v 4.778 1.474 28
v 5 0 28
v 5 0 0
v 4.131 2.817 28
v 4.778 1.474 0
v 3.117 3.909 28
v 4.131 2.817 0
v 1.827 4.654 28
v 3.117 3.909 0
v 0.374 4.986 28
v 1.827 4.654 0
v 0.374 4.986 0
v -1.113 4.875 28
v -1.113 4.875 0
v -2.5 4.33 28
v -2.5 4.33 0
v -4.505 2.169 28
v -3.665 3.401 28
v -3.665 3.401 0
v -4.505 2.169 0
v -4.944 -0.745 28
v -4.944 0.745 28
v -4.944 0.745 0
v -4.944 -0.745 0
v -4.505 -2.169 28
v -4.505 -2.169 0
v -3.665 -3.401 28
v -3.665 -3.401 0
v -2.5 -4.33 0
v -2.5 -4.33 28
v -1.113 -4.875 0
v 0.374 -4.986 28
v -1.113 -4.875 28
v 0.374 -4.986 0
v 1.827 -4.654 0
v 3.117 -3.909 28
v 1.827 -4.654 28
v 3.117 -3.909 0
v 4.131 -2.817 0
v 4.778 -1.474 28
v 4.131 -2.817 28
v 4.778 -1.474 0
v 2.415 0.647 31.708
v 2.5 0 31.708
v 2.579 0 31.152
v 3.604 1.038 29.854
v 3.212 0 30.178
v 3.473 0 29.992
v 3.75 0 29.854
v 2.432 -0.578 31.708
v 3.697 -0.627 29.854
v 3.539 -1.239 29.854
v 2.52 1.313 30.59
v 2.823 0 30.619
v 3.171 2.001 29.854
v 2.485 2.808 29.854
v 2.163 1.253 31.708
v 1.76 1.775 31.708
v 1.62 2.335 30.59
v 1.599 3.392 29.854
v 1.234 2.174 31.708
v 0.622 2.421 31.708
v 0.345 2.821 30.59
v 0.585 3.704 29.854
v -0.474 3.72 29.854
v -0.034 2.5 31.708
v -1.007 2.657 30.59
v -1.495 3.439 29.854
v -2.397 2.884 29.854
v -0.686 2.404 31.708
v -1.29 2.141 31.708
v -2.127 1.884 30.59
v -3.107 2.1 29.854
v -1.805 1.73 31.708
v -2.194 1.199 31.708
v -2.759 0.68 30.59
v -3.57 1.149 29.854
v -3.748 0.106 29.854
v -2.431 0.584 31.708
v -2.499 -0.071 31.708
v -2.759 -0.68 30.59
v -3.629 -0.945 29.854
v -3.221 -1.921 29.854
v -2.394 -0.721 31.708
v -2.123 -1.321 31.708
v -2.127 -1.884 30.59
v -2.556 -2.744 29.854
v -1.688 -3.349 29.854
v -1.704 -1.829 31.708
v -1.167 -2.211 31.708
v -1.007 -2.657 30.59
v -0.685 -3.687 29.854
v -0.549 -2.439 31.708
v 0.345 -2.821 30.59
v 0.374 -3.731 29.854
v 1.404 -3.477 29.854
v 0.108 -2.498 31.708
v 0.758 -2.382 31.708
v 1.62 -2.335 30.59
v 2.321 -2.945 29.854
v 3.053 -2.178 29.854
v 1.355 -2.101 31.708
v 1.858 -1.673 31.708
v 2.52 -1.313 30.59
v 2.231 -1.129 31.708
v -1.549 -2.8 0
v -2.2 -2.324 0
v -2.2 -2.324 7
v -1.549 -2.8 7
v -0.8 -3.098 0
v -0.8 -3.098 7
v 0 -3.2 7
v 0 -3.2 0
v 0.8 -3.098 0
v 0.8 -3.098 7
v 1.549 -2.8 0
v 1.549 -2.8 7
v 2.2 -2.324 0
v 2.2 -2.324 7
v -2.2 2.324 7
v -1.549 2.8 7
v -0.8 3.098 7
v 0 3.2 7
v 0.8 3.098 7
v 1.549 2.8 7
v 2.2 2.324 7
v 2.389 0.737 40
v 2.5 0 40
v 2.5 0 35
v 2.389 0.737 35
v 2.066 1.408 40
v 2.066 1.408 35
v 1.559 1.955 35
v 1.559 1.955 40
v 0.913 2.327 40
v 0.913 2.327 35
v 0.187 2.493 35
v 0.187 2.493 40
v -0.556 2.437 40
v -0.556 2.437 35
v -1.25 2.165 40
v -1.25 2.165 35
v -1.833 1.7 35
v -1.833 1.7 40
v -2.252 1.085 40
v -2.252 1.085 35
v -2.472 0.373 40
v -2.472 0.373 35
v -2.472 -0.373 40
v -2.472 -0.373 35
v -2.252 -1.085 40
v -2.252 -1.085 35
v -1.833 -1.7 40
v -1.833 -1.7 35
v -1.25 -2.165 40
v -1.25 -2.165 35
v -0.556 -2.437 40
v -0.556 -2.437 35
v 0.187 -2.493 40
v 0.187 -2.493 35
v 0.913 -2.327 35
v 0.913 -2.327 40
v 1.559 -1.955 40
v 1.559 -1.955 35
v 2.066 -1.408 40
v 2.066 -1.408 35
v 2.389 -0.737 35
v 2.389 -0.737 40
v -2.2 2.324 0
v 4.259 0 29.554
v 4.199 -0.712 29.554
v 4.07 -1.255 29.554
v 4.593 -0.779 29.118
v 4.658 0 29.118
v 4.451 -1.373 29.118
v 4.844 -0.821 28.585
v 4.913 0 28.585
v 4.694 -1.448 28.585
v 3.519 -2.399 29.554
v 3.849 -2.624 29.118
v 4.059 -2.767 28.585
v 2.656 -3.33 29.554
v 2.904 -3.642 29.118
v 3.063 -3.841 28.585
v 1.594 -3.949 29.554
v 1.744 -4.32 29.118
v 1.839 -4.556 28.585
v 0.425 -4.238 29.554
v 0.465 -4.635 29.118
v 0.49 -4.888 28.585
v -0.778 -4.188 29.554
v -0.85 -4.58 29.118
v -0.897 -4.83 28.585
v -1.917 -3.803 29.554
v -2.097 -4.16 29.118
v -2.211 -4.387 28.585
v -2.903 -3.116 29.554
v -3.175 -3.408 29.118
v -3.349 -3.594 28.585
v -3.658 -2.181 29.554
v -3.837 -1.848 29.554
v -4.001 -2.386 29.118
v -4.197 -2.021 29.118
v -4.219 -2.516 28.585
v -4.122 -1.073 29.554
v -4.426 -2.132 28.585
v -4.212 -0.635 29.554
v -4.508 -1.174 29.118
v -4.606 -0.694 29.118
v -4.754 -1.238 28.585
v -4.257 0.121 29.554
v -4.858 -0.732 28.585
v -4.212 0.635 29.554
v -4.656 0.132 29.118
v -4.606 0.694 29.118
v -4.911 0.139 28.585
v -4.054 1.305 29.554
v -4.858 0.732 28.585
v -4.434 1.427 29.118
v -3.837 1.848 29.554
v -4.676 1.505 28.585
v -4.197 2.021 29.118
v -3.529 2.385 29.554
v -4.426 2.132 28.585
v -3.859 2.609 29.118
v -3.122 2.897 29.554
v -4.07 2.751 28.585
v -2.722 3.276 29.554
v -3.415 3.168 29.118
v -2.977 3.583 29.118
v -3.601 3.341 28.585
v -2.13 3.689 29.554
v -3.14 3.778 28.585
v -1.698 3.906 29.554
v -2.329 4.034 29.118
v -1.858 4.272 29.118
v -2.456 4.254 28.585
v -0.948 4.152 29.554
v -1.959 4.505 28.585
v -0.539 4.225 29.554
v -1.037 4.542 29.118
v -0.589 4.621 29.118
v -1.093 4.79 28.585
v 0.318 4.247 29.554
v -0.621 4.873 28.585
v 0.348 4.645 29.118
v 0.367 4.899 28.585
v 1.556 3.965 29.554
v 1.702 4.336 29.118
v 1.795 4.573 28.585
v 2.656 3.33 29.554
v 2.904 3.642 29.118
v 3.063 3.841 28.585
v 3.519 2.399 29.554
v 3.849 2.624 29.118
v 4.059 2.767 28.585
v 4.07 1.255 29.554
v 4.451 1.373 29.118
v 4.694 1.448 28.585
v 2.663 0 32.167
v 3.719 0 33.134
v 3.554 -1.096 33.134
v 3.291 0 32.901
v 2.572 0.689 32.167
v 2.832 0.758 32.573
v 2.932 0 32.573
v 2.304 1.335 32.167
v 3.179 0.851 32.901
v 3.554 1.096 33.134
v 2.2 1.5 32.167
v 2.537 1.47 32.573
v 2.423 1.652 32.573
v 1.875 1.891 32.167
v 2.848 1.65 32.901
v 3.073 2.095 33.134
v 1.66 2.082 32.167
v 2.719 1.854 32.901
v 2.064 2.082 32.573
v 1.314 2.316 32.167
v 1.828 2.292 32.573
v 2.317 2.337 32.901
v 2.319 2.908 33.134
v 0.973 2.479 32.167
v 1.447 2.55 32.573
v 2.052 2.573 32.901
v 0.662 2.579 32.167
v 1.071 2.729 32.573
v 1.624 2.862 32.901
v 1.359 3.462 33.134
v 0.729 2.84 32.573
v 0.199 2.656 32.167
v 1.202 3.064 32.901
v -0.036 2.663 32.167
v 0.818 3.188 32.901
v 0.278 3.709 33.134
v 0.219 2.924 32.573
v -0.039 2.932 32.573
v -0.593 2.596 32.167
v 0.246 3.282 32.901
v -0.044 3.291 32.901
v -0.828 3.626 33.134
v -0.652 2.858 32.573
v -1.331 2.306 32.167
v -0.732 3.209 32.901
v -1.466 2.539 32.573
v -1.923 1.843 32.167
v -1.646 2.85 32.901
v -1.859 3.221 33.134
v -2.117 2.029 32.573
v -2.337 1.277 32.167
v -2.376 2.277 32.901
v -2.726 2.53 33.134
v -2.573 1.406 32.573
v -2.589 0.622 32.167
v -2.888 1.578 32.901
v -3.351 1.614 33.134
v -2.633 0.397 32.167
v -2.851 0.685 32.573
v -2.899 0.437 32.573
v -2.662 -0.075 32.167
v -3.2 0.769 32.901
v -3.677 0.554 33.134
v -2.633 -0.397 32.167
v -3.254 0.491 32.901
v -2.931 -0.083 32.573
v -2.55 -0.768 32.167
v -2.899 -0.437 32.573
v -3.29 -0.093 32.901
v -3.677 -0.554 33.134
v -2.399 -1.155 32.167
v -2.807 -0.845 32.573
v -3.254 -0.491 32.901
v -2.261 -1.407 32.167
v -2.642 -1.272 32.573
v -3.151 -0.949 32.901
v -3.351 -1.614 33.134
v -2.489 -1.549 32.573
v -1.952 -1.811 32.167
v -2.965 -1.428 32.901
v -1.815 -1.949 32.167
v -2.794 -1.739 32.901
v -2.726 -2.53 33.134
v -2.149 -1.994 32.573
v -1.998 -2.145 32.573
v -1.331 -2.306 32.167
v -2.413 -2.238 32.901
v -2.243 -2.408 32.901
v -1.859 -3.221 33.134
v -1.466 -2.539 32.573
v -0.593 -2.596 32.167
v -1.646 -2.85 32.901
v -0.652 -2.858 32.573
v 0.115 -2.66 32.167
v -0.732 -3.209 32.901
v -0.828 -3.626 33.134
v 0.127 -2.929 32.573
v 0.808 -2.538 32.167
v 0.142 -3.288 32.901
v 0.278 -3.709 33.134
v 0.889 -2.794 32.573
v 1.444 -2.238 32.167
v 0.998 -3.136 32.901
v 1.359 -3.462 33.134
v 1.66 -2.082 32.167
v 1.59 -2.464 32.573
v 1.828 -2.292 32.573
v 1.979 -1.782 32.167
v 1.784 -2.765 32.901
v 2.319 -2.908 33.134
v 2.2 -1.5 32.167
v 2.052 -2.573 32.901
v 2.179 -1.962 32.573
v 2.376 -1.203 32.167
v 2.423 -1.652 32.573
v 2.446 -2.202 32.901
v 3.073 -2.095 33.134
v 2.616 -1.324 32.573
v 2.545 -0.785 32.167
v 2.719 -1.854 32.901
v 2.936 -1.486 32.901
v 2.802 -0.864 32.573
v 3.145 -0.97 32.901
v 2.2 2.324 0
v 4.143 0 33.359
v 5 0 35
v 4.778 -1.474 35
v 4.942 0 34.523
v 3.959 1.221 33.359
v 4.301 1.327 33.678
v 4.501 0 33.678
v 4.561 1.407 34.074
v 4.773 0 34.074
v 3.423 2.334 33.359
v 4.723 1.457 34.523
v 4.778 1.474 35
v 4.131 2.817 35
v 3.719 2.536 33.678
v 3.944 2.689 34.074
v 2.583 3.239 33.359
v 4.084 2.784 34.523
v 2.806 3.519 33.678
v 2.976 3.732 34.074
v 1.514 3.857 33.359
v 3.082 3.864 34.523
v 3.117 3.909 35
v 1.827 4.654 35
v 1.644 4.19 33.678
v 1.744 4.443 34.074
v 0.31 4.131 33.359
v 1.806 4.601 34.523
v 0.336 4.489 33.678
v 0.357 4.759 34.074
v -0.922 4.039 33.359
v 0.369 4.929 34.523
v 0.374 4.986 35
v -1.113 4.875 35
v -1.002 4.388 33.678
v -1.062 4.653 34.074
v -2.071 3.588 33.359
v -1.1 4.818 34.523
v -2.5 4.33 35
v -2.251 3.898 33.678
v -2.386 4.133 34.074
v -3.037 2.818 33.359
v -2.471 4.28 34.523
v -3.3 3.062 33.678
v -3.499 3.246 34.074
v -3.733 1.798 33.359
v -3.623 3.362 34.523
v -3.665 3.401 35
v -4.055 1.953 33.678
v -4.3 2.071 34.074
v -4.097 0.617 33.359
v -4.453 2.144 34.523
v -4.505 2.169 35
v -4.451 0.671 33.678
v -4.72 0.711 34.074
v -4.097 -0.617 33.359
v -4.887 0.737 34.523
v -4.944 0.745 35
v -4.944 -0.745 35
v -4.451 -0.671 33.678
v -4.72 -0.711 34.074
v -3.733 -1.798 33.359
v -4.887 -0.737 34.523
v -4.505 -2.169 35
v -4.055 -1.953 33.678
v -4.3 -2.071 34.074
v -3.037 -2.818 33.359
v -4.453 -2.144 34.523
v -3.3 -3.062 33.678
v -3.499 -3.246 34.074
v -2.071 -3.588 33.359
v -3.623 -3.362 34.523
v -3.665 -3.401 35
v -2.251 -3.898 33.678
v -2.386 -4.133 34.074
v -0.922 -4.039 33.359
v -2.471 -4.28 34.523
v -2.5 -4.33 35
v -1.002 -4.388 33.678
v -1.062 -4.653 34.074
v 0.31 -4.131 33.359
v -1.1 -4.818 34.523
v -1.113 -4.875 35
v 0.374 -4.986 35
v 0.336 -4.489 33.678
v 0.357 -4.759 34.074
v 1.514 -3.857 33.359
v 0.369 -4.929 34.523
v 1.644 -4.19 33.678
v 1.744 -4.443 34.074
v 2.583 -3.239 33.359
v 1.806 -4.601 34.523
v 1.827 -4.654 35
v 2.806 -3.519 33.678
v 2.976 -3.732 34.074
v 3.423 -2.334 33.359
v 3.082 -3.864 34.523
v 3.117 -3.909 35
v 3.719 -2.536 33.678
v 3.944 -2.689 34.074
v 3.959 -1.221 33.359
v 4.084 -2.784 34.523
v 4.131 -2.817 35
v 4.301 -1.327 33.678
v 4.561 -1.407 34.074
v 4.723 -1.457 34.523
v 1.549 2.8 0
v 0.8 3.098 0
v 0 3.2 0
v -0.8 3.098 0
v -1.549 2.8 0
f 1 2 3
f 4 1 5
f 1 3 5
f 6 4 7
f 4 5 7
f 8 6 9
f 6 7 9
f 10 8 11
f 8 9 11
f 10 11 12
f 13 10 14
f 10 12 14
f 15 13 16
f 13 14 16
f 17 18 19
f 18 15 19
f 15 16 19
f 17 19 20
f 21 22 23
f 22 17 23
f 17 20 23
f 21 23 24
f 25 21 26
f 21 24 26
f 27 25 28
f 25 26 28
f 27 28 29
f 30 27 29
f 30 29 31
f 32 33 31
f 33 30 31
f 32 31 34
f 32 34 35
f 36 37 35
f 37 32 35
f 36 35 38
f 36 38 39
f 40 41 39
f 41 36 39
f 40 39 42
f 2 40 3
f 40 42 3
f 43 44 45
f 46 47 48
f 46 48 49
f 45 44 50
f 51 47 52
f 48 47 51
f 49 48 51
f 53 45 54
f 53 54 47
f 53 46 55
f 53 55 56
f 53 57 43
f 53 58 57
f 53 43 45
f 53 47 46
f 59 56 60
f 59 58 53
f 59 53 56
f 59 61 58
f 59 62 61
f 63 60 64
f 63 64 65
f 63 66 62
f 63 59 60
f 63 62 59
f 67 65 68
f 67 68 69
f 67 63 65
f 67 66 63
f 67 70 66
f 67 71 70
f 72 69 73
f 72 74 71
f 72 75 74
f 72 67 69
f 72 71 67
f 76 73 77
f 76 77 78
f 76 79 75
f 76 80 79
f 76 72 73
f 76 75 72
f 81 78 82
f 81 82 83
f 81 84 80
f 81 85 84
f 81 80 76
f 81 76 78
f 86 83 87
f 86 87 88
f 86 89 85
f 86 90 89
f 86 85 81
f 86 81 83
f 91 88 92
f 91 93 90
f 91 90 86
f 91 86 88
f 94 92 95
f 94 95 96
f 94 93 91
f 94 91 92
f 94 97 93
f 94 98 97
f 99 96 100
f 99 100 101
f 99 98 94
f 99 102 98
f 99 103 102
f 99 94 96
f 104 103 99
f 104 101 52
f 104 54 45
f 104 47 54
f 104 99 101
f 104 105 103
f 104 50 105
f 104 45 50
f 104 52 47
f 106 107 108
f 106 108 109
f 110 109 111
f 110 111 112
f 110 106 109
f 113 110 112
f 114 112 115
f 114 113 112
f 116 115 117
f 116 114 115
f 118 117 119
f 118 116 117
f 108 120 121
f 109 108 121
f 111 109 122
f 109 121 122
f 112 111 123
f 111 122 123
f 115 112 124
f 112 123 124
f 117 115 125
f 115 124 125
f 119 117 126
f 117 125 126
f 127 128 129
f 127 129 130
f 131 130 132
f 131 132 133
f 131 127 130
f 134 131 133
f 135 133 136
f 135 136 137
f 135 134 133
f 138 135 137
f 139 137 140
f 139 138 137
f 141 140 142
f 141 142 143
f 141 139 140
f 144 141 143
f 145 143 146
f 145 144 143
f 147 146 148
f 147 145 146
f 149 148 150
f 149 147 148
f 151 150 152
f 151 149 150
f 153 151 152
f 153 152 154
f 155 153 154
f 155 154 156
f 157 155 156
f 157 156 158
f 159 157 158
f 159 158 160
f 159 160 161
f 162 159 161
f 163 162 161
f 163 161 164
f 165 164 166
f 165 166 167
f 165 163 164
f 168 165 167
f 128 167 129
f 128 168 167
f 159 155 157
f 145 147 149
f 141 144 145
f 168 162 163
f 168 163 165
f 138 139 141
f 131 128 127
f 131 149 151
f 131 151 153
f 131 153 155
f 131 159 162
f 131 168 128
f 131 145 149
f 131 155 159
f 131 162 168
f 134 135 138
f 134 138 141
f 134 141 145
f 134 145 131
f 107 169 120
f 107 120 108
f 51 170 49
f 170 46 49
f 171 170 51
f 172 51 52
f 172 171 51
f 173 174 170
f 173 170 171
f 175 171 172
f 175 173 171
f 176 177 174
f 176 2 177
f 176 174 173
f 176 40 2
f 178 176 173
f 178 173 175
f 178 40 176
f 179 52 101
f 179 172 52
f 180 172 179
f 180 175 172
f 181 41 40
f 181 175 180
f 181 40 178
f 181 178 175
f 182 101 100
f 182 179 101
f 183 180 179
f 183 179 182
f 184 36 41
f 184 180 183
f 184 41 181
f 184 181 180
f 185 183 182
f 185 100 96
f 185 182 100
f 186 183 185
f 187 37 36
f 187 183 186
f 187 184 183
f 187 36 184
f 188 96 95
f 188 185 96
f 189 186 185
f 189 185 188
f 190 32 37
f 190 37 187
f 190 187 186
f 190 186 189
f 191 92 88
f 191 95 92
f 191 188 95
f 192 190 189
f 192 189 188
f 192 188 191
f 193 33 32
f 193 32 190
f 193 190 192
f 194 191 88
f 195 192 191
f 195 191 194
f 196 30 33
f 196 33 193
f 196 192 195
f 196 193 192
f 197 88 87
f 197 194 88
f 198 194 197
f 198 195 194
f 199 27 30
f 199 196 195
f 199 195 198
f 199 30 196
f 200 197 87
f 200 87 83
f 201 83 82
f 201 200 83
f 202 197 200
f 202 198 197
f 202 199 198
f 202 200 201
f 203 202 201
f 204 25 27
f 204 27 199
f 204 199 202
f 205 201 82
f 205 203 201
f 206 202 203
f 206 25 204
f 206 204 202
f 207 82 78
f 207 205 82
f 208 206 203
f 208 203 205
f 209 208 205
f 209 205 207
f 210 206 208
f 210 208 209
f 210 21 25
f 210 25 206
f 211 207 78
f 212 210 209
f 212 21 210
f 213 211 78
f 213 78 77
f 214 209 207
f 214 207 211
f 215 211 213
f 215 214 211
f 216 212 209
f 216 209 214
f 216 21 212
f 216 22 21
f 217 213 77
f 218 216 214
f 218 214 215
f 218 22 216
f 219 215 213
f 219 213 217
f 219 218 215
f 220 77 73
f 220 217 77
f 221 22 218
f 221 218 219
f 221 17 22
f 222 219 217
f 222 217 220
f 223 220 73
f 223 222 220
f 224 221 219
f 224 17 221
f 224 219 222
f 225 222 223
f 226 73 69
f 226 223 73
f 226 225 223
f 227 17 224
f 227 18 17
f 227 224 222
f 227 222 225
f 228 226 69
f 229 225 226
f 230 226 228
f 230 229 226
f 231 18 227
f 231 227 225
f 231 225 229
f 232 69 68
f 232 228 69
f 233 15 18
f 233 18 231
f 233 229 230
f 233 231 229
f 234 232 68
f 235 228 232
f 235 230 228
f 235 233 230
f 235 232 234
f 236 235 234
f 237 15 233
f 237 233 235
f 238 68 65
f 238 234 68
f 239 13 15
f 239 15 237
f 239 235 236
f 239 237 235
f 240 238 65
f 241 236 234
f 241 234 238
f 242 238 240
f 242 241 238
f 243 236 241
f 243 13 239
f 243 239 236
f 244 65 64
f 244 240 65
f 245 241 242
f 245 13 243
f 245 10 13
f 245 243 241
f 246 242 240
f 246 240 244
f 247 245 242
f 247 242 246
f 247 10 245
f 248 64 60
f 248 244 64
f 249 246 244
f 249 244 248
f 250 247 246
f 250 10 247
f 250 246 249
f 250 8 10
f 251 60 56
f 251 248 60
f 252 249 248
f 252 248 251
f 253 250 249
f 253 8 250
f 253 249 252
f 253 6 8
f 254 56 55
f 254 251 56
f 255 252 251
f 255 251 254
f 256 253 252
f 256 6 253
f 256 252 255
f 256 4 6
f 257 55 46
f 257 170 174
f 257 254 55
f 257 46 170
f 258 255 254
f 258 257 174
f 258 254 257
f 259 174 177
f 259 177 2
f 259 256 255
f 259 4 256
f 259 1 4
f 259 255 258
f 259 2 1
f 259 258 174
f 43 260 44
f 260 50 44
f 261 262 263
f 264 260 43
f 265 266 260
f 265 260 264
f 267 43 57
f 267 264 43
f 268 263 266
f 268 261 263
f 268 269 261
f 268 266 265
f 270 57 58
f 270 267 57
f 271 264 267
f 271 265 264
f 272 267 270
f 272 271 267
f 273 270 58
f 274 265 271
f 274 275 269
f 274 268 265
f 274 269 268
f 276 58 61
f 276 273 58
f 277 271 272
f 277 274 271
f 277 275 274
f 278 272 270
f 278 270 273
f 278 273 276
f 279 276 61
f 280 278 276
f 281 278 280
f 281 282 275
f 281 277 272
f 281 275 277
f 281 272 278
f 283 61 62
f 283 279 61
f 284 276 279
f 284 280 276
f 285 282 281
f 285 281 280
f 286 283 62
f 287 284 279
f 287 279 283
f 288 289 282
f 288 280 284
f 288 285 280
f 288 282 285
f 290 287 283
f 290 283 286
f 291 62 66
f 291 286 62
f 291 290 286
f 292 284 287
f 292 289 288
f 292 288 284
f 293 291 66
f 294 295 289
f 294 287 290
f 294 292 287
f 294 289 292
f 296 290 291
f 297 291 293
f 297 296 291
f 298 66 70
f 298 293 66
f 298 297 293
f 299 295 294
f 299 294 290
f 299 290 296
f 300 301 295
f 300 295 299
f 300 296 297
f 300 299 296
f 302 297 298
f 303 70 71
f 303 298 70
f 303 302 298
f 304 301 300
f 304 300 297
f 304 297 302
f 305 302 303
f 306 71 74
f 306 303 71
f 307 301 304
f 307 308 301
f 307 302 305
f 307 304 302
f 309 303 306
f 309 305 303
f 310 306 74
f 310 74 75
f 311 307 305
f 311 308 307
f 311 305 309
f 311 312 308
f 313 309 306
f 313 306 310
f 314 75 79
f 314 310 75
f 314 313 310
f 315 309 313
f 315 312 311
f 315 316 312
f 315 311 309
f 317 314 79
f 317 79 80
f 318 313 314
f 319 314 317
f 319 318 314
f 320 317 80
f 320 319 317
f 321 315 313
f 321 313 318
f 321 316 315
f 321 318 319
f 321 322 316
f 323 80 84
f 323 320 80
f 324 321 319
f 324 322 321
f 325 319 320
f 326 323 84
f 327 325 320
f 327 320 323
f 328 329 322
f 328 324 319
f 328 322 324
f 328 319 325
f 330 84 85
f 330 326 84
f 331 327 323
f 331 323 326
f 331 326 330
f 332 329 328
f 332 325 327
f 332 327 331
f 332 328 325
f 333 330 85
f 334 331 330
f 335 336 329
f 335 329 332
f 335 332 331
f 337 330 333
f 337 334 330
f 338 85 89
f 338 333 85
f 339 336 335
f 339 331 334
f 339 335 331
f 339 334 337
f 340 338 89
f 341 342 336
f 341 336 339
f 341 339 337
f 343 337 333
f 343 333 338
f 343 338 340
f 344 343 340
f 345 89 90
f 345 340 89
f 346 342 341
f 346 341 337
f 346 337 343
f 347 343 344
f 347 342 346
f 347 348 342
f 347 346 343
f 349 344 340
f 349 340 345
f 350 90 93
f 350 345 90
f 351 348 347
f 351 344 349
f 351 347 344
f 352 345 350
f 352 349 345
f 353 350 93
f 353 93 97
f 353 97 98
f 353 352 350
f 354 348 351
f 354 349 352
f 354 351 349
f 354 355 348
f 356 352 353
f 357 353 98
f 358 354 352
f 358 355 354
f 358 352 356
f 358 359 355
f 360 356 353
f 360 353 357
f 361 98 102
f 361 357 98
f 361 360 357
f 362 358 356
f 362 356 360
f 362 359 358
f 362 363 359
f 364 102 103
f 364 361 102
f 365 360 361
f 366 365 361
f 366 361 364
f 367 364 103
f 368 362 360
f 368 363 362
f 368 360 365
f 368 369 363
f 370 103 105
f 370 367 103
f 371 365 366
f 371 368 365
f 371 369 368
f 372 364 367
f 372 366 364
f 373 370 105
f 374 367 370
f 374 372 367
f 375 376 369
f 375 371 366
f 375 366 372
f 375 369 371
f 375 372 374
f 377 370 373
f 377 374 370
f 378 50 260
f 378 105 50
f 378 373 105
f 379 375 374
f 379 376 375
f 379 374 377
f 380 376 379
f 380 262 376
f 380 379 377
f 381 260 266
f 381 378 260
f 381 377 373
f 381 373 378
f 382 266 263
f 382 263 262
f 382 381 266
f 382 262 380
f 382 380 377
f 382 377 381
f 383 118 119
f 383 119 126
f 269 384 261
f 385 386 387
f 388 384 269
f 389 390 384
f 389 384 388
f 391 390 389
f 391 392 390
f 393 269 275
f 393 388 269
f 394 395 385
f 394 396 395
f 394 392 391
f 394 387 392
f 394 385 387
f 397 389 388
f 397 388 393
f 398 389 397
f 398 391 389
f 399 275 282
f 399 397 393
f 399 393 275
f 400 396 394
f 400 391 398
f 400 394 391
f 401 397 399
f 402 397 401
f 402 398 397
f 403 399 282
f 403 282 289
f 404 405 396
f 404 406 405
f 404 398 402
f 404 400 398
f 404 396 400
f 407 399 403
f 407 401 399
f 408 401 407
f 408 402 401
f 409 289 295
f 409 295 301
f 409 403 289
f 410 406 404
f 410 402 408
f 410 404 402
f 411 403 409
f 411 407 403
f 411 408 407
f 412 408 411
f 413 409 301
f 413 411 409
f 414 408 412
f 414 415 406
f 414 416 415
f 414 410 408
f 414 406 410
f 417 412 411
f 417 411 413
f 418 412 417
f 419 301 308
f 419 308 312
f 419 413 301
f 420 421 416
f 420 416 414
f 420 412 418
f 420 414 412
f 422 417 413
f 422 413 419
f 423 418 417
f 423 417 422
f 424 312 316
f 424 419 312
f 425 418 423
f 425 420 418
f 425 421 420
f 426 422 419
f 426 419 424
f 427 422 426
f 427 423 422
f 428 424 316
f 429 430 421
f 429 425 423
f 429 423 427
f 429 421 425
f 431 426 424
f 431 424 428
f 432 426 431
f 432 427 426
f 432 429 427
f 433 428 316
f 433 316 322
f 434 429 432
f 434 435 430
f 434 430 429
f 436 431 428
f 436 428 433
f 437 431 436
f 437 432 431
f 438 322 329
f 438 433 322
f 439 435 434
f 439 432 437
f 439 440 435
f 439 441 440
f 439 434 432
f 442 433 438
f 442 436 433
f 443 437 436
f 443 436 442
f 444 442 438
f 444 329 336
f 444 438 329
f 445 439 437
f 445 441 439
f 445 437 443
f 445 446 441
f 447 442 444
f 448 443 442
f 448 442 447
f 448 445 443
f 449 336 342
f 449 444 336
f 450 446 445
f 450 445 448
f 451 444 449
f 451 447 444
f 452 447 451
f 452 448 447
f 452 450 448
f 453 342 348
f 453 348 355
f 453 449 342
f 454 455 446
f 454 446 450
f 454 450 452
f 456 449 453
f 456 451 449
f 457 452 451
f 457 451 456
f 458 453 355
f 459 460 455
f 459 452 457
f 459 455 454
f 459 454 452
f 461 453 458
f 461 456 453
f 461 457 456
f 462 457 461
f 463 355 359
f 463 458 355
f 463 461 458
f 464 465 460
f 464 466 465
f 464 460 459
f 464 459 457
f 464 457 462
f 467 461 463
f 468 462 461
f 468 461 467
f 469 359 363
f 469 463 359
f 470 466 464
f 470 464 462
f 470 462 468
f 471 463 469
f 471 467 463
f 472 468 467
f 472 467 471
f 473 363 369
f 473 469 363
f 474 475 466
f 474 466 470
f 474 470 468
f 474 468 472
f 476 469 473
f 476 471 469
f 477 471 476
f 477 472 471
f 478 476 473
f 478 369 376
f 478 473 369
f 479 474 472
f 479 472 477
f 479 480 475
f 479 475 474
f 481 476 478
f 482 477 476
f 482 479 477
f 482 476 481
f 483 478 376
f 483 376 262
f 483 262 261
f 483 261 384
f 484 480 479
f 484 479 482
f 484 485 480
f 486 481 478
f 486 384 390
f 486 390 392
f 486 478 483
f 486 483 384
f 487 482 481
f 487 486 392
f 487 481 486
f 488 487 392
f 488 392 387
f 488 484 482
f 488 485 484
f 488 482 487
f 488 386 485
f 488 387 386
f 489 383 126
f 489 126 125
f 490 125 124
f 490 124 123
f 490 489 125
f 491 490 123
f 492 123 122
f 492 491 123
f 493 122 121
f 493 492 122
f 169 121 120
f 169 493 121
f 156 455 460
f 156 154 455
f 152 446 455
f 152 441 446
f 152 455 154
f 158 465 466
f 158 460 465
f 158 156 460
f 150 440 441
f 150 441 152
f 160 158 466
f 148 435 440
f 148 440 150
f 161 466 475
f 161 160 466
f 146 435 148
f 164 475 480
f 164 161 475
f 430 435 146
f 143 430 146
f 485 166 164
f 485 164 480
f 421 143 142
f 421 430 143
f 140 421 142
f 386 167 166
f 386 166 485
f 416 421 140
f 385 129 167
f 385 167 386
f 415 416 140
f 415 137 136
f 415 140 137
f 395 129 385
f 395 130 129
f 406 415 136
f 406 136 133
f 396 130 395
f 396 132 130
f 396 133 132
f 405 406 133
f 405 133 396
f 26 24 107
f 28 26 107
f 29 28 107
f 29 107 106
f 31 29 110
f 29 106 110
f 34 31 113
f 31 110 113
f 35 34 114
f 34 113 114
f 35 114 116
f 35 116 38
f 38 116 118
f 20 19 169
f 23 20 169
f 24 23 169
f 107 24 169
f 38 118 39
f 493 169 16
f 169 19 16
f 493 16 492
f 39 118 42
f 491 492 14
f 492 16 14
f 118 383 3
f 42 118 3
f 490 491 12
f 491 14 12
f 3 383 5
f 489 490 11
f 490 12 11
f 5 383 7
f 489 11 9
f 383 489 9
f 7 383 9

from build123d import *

# Parameters (mm, degrees)
SKETCH_1_R          = 5
EXTRUDE_1_DEPTH     = 40
CUT_EXTRUDE_1_DEPTH = 7
SKETCH_4_R          = 6.5
SKETCH_4_R_2        = 2.5
CUT_EXTRUDE_4_DEPTH = 10
EXTRUDE_START       = -7
SKETCH_7_R          = 5
EXTRUDE_2_DEPTH     = 7
SKETCH_10_R         = 6.5
SKETCH_10_R_2       = 2.5
CUT_EXTRUDE_5_DEPTH = 5
FILLET_3_R          = 2
FILLET_4_R          = 2
FILLET_5_R          = 2


with BuildPart() as part:
    # Эскиз1 → Бобышка-Вытянуть1 (new body)
    with BuildSketch(Plane.XY):
        Circle(SKETCH_1_R)
    extrude(amount=EXTRUDE_1_DEPTH)

    # Эскиз3 → Вырез-Вытянуть1 (cut)
    with BuildSketch(Plane(origin=(0, 0, 0), x_dir=(-1, 0, 0), z_dir=(0, 0, -1))):
        with BuildLine():
            Line((-2.2, -2.323790008), (-2.2, 2.323790008))
            ThreePointArc((-2.2, 2.323790008), (0, 3.2), (2.2, 2.323790008))
            Line((2.2, 2.323790008), (2.2, -2.323790008))
            ThreePointArc((2.2, -2.323790008), (0, -3.2), (-2.2, -2.323790008))
        make_face()
    extrude(amount=-CUT_EXTRUDE_1_DEPTH, mode=Mode.SUBTRACT)

    # Эскиз4 → Вырез-Вытянуть-Тонкостенный4 (cut)
    with BuildSketch(Plane.XY.offset(40)):
        Circle(SKETCH_4_R)
        Circle(SKETCH_4_R_2, mode=Mode.SUBTRACT)
    extrude(amount=-CUT_EXTRUDE_4_DEPTH, mode=Mode.SUBTRACT)

    # Эскиз7 → Бобышка-Вытянуть2 (add)
    with BuildSketch(Plane.XY.offset(40).offset(EXTRUDE_START)):
        Circle(SKETCH_7_R)
    extrude(amount=EXTRUDE_2_DEPTH)

    # Эскиз10 → Вырез-Вытянуть-Тонкостенный5 (cut)
    with BuildSketch(Plane.XY.offset(40)):
        Circle(SKETCH_10_R)
        Circle(SKETCH_10_R_2, mode=Mode.SUBTRACT)
    extrude(amount=-CUT_EXTRUDE_5_DEPTH, mode=Mode.SUBTRACT)

    # Скругление3
    fillet_3_edges = [part.edges().sort_by_distance(p)[0] for p in [
        (-5, 0, 30),
    ]]
    fillet(fillet_3_edges, radius=FILLET_3_R)

    # Скругление4
    fillet_4_edges = [part.edges().sort_by_distance(p)[0] for p in [
        (-5, 0, 33),
    ]]
    fillet(fillet_4_edges, radius=FILLET_4_R - 0.0001)  # a hair under: the kernel refuses the full size

    # Скругление5
    fillet_5_edges = [part.edges().sort_by_distance(p)[0] for p in [
        (-2.5, 0, 30),
    ]]
    fillet(fillet_5_edges, radius=FILLET_5_R)

    # Скругление6: read off the stored shape, not the designer's step
    # Скругление6 outline → Скругление6 (revolve)
    with BuildSketch(Plane.XZ):
        with BuildLine():
            Line((3.726034838, 33.136435294), (3, 33.136435294))
            Line((3, 33.136435294), (3, 33))
            Line((3, 33), (2.5, 33))
            Line((2.5, 33), (2.5, 31.708099244))
            ThreePointArc((2.5, 31.708099244), (2.934473908, 32.575522915), (3.726034838, 33.136435294))
        make_face()
    revolve(axis=Axis((0, 0, 0), (0, 0, 1)))


solid = part.part
